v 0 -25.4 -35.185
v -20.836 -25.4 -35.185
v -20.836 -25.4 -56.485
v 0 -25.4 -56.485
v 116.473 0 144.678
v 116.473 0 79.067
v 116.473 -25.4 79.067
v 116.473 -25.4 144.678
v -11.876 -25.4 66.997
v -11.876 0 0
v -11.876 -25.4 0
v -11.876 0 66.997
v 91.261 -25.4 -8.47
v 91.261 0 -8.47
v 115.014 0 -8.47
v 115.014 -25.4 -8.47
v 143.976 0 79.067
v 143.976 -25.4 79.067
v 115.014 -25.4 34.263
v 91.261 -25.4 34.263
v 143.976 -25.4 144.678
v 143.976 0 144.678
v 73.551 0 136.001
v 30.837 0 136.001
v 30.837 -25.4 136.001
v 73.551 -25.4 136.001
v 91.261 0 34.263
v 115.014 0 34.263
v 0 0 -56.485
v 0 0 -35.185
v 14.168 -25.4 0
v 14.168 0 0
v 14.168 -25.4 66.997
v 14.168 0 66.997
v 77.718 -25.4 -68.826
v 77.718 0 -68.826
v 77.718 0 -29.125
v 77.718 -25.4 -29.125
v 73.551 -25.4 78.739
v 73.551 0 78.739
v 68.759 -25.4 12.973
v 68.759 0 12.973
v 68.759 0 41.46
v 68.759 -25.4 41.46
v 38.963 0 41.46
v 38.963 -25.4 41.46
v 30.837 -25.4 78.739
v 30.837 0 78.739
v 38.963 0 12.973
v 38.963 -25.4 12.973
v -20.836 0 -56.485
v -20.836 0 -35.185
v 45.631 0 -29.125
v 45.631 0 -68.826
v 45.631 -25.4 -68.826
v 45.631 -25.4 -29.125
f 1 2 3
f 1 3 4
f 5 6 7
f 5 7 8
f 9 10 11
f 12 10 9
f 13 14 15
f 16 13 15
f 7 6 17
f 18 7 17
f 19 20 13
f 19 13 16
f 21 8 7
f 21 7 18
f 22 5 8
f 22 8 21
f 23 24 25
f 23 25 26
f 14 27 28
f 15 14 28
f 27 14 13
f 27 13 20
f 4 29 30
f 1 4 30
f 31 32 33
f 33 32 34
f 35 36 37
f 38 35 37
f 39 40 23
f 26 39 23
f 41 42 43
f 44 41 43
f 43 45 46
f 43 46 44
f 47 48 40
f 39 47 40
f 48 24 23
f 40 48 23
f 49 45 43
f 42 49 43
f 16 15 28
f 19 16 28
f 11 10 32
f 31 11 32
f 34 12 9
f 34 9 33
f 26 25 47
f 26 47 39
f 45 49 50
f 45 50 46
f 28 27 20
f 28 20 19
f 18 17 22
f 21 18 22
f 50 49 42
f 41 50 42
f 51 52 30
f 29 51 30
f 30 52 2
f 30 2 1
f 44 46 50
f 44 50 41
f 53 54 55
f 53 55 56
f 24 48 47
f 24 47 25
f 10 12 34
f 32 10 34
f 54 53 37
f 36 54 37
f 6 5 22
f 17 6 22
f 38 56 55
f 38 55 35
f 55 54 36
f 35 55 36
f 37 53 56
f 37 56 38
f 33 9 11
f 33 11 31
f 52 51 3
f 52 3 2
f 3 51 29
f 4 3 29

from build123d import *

# Parameters (mm, degrees)
F0_W     = 42.713653
F0_H     = 57.261646
F0_W_2   = 27.503371
F0_H_2   = 65.611295
F0_W_3   = 23.75295
F0_H_3   = 42.732641
F0_W_4   = 32.087333
F0_H_4   = 39.701626
F0_W_5   = 29.795386
F0_H_5   = 28.486781
F0_W_6   = 26.04492
F0_H_6   = 66.996962
F0_W_7   = 20.835944
F0_H_7   = 21.299526
F1_DEPTH = 25.4


with BuildPart() as f1:
    # F0 (on Front) → F1 (new body)
    with BuildSketch(Plane.XZ):
        with Locations((52.194038, 107.370287)):
            Rectangle(F0_W, F0_H)
        with Locations((130.22457, 111.872692)):
            Rectangle(F0_W_2, F0_H_2)
        with Locations((103.137877, 12.89618)):
            Rectangle(F0_W_3, F0_H_3)
        with Locations((61.674346, -48.975356)):
            Rectangle(F0_W_4, F0_H_4)
        with Locations((53.860884, 27.216379)):
            Rectangle(F0_W_5, F0_H_5)
        with Locations((1.145974, 33.498481)):
            Rectangle(F0_W_6, F0_H_6)
        with Locations((-10.417972, -45.834936)):
            Rectangle(F0_W_7, F0_H_7)
    extrude(amount=F1_DEPTH)


solid = f1.part
